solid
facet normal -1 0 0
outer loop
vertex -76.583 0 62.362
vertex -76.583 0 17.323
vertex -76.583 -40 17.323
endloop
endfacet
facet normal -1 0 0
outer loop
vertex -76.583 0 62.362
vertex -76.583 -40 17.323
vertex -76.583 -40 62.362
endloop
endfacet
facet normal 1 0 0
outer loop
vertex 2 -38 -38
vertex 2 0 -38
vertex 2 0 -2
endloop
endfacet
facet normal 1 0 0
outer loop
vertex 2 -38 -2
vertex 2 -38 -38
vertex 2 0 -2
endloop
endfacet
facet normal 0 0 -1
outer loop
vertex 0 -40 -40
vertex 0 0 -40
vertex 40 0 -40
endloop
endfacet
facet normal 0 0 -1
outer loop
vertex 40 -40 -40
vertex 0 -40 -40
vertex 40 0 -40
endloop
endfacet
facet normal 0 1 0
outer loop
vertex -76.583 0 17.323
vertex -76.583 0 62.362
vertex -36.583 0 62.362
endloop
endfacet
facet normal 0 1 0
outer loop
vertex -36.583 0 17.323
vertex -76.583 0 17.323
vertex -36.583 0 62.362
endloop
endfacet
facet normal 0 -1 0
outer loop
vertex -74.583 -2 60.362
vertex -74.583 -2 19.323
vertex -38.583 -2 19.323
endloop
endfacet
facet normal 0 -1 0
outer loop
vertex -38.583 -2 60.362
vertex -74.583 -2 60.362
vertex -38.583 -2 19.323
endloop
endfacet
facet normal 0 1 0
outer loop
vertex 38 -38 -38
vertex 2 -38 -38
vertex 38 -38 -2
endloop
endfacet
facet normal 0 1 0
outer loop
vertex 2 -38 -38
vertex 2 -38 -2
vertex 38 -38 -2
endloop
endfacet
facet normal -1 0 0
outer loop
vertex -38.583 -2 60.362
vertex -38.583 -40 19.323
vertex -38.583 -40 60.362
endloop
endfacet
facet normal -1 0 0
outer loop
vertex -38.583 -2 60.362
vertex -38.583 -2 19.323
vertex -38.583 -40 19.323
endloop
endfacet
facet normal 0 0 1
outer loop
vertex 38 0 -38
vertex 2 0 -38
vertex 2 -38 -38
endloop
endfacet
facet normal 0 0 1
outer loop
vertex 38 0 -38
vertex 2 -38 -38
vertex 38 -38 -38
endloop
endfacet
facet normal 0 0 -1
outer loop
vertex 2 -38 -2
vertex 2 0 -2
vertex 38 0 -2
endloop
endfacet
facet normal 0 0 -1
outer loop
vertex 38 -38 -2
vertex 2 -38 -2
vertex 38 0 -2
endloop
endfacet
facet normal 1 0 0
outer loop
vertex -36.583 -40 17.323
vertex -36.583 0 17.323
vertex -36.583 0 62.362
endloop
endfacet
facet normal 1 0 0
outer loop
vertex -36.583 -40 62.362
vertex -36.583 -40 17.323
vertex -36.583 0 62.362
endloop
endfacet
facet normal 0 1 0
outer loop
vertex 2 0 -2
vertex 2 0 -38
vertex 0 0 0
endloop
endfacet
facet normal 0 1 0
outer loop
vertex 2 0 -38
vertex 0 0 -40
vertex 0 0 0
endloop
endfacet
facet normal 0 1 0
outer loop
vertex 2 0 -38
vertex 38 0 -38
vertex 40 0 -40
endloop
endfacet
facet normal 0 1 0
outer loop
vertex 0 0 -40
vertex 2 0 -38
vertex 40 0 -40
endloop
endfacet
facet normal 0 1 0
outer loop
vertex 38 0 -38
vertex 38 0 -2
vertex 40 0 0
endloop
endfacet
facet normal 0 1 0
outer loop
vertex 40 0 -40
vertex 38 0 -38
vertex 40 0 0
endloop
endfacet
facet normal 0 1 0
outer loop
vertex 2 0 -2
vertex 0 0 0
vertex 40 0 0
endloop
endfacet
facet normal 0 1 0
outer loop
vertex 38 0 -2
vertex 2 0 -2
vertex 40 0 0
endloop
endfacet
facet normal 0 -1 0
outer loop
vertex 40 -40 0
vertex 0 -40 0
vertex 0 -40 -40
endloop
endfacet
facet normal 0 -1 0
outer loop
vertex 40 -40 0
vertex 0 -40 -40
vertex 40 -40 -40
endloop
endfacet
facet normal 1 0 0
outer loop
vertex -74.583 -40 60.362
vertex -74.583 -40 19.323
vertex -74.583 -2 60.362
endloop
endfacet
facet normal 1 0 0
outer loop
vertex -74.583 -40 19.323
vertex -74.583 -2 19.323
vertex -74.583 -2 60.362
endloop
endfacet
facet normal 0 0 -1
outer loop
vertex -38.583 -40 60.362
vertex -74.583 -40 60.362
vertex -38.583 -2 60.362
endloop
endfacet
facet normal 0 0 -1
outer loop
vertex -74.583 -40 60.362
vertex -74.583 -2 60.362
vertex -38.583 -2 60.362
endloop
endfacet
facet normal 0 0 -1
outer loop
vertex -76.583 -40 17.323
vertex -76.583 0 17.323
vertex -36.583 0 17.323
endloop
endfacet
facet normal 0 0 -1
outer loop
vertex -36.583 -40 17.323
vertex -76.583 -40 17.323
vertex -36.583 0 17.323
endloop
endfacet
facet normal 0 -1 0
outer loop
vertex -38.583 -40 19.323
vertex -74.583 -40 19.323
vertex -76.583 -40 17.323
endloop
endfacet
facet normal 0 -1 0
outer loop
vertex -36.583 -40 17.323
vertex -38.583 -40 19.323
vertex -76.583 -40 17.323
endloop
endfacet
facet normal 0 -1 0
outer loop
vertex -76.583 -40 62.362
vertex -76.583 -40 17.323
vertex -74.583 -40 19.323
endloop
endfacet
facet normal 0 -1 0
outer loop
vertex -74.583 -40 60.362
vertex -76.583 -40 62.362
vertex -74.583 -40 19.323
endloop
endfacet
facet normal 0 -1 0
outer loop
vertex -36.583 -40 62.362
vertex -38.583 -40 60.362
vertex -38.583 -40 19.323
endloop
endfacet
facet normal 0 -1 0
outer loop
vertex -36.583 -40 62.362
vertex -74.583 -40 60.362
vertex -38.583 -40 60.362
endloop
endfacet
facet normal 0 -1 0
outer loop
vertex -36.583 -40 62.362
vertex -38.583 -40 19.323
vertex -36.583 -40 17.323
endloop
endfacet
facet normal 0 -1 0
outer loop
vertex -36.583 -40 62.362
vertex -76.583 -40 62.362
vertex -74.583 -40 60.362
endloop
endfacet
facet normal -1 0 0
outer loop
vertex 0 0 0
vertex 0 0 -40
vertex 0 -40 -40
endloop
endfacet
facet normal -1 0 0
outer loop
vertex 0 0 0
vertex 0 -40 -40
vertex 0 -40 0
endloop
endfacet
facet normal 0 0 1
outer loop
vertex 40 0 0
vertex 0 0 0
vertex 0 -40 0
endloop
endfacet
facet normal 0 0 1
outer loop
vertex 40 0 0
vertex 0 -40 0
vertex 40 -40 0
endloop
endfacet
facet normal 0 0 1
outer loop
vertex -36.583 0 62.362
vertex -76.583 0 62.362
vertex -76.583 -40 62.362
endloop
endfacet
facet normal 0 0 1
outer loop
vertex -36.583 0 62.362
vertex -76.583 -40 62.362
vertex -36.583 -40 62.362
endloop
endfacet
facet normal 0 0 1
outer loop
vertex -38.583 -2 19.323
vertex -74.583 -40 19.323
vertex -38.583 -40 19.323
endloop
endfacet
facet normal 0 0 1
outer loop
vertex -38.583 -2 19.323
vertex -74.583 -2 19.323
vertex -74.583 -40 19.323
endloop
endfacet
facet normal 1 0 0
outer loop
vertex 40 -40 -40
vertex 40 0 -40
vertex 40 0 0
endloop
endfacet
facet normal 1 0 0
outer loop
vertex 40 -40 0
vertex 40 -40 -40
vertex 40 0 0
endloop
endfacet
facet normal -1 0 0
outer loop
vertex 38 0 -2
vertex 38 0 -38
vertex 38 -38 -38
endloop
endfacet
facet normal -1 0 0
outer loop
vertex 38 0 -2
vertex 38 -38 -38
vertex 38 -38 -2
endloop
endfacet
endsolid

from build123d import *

# Parameters (mm, degrees)
F0_W     = 40
F0_H     = 45.038354
F1_DEPTH = 40
F2_T     = -2
F4_W     = 40
F4_H     = 40
F5_DEPTH = 40
F6_T     = -2


with BuildPart() as f1:
    # F0 (on Front) → F1 (new body)
    with BuildSketch(Plane.XZ):
        with Locations((-56.582971, 39.842363)):
            Rectangle(F0_W, F0_H)
    extrude(amount=F1_DEPTH)

    # F2
    f2_openings = [f1.faces().sort_by_distance(p)[0] for p in [
        (-56.582971, -40, 39.842363),
    ]]
    offset(amount=F2_T, openings=f2_openings)


with BuildPart() as f5:
    # F4 (on Front) → F5 (new body)
    with BuildSketch(Plane.XZ):
        with Locations((20, -20)):
            Rectangle(F4_W, F4_H)
    extrude(amount=F5_DEPTH)

    # F6
    f6_openings = [f5.faces().sort_by_distance(p)[0] for p in [
        (20, 0, -20),
    ]]
    offset(amount=F6_T, openings=f6_openings)


solid = Compound([f1.part, f5.part])
